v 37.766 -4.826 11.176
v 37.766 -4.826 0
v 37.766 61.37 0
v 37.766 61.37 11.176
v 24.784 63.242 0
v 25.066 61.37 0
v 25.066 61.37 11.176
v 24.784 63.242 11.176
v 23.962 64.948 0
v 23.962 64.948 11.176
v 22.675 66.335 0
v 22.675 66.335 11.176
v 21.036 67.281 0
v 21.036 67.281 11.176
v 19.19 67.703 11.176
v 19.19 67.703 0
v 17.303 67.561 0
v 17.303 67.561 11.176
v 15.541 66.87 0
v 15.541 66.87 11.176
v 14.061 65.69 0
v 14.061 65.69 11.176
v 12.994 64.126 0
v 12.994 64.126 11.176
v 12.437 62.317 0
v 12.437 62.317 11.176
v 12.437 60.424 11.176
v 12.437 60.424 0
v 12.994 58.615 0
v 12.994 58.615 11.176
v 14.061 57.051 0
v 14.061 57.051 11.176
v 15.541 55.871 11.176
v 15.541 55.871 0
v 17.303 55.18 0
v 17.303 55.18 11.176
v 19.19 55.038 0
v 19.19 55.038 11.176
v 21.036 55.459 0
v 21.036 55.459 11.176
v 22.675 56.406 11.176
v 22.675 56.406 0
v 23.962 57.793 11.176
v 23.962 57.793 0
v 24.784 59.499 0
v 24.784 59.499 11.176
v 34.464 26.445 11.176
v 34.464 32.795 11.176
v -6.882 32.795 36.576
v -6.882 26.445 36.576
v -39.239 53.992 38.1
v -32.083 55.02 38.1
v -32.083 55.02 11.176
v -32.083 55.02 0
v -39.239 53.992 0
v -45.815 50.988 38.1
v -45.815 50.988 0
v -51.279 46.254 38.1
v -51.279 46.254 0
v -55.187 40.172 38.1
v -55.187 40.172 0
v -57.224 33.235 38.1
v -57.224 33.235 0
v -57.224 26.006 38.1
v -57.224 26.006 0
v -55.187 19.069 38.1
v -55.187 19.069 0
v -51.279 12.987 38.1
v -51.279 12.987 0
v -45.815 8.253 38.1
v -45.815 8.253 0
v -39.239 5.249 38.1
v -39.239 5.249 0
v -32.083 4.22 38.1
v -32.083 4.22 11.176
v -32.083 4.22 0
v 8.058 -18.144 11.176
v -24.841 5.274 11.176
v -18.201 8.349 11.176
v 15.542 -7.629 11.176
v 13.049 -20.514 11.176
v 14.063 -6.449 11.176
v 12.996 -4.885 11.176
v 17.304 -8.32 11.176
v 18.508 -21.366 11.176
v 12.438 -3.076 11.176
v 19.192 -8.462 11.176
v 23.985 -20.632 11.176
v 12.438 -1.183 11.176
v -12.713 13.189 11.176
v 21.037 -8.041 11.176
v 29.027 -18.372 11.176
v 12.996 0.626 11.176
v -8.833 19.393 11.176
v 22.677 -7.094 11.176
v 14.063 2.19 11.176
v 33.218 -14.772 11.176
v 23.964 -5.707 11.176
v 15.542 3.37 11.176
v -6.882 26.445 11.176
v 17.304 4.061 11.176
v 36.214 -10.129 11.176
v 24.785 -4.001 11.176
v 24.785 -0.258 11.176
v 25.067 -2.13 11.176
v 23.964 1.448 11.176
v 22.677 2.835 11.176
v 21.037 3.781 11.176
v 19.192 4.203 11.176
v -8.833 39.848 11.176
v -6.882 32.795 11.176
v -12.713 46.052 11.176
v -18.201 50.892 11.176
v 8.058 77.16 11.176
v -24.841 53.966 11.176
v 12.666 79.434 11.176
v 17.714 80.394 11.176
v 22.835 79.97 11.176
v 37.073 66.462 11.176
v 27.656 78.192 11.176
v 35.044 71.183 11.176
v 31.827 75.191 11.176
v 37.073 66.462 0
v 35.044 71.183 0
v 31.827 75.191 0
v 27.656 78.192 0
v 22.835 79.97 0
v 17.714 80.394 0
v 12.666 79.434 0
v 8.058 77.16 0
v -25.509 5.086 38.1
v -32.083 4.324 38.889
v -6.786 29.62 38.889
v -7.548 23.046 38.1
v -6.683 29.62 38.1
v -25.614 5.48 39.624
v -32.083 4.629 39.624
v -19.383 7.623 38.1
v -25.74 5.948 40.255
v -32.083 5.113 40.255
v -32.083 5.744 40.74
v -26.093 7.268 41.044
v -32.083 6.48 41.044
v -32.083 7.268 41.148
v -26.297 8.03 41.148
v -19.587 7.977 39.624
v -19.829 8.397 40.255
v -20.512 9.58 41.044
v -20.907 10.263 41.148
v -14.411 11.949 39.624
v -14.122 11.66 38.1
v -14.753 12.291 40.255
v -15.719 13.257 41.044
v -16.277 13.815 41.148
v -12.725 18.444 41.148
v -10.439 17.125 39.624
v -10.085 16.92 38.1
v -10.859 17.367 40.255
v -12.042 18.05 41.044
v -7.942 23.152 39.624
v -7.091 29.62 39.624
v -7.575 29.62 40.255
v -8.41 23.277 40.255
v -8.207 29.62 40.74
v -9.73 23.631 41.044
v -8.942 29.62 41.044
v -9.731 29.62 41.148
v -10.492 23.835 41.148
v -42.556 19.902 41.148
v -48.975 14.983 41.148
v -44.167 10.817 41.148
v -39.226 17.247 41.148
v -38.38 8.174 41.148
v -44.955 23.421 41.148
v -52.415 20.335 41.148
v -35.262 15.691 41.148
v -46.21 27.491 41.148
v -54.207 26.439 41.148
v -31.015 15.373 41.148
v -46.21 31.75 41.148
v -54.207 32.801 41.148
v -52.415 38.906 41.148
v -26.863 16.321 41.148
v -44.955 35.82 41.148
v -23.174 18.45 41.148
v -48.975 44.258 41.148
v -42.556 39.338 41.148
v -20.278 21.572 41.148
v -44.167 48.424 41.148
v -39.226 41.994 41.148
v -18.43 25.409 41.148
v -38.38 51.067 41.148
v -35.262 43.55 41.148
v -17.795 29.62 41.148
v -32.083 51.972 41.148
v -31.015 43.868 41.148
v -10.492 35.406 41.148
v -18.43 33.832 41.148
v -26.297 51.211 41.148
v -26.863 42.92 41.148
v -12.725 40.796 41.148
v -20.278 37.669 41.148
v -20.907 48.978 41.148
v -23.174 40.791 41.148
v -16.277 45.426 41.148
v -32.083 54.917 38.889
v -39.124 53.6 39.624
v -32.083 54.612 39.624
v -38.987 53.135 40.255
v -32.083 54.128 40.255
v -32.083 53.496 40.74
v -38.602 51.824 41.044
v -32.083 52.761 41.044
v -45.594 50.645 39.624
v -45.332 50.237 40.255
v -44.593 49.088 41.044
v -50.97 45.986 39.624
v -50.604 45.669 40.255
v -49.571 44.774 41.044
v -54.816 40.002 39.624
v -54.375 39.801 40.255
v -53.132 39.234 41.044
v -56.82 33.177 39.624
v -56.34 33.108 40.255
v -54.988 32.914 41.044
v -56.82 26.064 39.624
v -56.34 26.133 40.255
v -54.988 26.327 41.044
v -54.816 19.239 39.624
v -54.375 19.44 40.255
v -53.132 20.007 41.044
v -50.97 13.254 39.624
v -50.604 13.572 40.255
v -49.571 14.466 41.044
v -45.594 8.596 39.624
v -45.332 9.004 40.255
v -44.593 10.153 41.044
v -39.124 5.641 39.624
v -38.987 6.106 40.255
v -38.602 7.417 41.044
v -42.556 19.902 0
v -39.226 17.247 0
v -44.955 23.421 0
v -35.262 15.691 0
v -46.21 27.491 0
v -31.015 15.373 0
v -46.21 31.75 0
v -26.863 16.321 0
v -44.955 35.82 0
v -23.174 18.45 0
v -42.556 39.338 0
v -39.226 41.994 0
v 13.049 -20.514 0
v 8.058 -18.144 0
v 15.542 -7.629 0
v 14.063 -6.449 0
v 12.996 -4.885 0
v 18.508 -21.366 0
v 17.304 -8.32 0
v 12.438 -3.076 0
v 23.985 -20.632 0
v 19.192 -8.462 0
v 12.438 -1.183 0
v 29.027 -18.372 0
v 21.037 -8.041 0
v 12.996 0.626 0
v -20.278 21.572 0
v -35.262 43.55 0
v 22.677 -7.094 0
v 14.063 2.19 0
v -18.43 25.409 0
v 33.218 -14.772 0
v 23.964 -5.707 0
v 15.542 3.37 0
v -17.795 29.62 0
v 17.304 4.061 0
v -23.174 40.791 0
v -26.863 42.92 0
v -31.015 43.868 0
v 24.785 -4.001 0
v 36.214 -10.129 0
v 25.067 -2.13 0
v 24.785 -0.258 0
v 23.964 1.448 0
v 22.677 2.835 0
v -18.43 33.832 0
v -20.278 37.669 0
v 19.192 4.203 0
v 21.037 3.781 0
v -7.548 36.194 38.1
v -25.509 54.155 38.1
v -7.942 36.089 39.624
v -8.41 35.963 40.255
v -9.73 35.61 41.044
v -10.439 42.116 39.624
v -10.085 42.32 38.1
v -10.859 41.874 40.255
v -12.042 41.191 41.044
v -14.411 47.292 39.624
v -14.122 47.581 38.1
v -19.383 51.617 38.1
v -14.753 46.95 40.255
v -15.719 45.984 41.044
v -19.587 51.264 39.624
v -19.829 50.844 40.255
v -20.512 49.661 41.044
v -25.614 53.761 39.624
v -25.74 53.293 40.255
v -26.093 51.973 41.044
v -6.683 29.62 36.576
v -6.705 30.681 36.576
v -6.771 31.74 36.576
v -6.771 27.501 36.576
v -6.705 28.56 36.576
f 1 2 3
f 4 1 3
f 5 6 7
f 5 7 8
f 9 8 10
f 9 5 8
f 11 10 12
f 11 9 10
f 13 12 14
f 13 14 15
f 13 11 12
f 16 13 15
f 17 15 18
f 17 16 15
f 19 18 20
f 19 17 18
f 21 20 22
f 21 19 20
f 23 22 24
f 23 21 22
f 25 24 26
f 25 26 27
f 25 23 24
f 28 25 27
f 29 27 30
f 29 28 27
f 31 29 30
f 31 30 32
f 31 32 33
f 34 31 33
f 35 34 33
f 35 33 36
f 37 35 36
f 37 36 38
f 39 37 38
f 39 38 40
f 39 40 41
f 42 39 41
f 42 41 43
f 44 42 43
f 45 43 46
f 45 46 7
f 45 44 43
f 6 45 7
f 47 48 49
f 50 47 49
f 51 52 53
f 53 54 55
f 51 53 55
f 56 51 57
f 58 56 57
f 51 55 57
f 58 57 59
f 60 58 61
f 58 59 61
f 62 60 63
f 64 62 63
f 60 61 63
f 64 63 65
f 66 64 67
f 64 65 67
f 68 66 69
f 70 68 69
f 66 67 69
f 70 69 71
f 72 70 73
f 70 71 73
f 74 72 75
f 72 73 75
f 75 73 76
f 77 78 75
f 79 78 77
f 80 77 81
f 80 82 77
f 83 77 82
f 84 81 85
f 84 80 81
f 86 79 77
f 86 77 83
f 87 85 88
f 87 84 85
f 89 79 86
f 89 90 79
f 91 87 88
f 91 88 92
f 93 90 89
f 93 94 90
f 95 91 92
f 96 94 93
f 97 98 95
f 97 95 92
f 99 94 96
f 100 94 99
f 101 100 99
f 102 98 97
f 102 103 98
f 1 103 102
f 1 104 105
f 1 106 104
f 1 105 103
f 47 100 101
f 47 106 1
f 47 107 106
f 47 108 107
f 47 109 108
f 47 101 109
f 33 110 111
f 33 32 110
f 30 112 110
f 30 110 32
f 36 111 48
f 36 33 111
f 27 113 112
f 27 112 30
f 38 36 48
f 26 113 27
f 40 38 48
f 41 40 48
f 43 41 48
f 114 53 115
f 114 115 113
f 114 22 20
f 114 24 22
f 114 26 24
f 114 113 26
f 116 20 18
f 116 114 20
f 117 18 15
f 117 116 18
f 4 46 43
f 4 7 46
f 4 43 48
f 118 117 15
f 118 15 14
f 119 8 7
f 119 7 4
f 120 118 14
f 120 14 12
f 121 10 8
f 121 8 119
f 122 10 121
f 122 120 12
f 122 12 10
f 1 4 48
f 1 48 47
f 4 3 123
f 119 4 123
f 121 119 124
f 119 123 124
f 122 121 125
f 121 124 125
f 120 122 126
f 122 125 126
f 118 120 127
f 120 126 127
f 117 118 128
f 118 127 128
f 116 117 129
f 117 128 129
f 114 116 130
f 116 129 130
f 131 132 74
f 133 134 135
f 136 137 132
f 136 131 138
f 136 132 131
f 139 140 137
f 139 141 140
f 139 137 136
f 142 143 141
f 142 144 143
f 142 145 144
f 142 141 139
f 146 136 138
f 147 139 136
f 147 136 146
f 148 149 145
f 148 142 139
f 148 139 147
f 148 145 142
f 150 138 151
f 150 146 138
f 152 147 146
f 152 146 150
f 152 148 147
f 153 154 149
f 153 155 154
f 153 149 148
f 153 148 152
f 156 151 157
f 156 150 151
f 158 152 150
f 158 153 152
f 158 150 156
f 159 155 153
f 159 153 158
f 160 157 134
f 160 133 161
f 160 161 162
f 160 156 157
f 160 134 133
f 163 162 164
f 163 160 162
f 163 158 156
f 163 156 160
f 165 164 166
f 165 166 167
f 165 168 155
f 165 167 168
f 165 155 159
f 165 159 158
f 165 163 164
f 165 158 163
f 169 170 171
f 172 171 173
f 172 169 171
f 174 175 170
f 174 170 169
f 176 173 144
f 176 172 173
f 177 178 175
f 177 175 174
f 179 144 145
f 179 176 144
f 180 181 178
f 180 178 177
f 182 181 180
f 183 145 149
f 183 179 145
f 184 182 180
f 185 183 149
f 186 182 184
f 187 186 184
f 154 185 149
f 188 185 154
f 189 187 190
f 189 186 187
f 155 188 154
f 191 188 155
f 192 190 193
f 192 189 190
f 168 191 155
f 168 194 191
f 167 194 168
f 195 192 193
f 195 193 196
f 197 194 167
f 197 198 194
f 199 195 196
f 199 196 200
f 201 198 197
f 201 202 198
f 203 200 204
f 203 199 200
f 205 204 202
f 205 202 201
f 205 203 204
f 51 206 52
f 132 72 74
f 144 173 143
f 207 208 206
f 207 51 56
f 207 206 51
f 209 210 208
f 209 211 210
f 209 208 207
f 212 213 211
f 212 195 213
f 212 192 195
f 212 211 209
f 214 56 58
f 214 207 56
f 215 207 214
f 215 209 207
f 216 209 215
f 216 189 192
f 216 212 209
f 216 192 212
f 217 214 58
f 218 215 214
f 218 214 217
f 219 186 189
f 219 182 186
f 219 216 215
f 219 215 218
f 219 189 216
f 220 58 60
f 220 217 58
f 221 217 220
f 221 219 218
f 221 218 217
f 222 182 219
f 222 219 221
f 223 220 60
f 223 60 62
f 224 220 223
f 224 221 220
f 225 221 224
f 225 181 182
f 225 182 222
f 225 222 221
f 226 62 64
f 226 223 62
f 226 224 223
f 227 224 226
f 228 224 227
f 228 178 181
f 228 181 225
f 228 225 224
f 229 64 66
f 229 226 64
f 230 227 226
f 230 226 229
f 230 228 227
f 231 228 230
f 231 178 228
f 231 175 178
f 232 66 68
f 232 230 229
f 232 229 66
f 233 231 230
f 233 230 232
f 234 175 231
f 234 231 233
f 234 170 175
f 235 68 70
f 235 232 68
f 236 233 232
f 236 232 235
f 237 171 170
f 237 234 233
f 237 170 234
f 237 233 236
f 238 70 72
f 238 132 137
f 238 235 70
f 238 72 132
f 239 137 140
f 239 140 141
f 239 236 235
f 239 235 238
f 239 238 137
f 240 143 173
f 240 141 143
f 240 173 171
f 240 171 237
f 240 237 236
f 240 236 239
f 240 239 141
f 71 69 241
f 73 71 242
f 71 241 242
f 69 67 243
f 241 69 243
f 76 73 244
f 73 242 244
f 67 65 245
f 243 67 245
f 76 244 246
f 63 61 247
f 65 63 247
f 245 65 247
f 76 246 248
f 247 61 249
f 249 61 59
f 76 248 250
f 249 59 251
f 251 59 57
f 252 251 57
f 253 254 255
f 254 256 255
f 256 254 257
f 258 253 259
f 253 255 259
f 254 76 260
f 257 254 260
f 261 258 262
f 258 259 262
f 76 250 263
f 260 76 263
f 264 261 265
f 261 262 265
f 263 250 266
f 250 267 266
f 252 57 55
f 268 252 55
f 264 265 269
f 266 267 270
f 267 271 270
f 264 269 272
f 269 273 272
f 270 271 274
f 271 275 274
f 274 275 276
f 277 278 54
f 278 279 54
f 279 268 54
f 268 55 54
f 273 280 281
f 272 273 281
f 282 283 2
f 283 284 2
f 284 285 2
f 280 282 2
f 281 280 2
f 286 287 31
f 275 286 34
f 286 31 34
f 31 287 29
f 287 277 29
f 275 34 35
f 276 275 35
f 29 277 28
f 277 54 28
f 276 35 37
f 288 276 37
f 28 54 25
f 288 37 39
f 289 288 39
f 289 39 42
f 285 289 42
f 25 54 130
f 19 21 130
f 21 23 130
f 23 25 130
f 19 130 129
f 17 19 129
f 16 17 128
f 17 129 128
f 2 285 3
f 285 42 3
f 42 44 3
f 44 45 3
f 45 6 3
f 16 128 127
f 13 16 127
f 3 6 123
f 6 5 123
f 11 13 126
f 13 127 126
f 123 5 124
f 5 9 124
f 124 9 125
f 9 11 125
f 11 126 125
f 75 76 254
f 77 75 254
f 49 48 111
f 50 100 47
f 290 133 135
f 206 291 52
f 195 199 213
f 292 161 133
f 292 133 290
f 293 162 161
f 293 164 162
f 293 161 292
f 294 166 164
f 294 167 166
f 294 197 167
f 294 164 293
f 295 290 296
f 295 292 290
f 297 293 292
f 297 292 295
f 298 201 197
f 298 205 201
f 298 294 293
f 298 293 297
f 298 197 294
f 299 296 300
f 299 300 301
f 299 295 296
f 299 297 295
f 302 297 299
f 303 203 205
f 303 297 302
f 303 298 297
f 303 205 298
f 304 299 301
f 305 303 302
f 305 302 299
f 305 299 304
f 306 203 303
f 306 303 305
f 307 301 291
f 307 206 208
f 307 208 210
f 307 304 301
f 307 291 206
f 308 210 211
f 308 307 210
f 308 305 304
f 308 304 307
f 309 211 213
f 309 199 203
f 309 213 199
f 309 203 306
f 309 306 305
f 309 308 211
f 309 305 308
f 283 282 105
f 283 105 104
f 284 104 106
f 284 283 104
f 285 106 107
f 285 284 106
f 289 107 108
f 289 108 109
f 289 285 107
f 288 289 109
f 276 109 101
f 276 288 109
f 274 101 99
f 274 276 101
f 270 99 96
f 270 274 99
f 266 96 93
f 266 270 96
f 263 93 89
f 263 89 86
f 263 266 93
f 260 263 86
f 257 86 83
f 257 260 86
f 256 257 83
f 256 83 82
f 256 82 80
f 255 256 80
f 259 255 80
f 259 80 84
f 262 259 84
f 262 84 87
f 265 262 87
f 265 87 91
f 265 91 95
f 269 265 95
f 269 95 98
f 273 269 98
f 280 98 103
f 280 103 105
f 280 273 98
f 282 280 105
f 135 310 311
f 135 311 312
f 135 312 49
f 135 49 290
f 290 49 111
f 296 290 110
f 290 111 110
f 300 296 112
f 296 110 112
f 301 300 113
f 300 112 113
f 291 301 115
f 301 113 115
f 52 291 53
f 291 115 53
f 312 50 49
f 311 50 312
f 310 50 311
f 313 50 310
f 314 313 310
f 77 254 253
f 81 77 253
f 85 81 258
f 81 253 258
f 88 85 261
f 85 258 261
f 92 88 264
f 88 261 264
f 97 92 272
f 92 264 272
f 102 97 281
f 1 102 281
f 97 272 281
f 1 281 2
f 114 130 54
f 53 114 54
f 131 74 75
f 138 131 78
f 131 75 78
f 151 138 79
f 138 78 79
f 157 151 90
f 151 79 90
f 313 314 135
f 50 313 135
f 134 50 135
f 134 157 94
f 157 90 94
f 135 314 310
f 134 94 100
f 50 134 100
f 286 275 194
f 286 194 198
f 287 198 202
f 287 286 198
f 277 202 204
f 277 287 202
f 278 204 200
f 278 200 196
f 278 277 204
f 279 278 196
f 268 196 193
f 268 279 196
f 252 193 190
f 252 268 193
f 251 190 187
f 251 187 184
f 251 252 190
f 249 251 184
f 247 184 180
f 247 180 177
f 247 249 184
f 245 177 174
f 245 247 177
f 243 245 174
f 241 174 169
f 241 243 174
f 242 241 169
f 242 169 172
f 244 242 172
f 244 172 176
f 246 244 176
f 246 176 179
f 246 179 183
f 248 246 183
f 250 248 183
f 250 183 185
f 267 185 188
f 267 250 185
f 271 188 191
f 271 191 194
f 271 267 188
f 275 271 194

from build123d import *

# Parameters (mm, degrees)
F0_R     = 14.2875
F1_DEPTH = 41.148
F0_R_2   = 6.35
F2_DEPTH = 11.176
F3_R     = 3.048
F5_DEPTH = 25.4
F7_DEPTH = 54.1640026378


with BuildPart() as f1:
    # F0 (on Top) → F1 (new body)
    with BuildSketch(Plane.XY):
        with BuildLine():
            ThreePointArc((-32.0825431228, 4.2204351945), (-14.1220308807, 11.6599229523), (-6.6825431228, 29.6204351945))
            ThreePointArc((-6.6825431228, 29.6204351945), (-14.1220308807, 47.5809474366), (-32.0825431228, 55.0204351945))
            ThreePointArc((-32.0825431228, 55.0204351945), (-57.4825431228, 29.6204351945), (-32.0825431228, 4.2204351945))
        make_face()
        with Locations((-32.0825431228, 29.6204351945)):
            Circle(F0_R, mode=Mode.SUBTRACT)
    extrude(amount=F1_DEPTH)

    # F0 (on Top) → F2 (join)
    with BuildSketch(Plane.XY):
        with BuildLine():
            ThreePointArc((-32.0825431228, 55.0204351945), (-14.1220308807, 47.5809474366), (-6.6825431228, 29.6204351945))
            ThreePointArc((-6.6825431228, 29.6204351945), (-14.1220308807, 11.6599229523), (-32.0825431228, 4.2204351945))
            Line((-32.0825431228, 4.2204351945), (8.057578387, -18.1441748871))
            ThreePointArc((8.057578387, -18.1441748871), (26.5875021064, -19.6841406643), (37.7656240054, -4.8255014786))
            Line((37.7656240054, -4.8255014786), (37.7656240054, 61.3704351945))
            ThreePointArc((37.7656240054, 61.3704351945), (27.6561701568, 78.1921216294), (8.057578387, 77.159943217))
            Line((8.057578387, 77.159943217), (-32.0825431228, 55.0204351945))
        make_face()
        with Locations((18.7174568772, -2.1295648055)):
            Circle(F0_R_2, mode=Mode.SUBTRACT)
        with Locations((18.7156240054, 61.3704351945)):
            Circle(F0_R_2, mode=Mode.SUBTRACT)
    extrude(amount=F2_DEPTH)

    # F3
    f3_edges = [f1.edges().sort_by_distance(p)[0] for p in [
        (-32.082543, 4.220435, 41.148),
    ]]
    fillet(f3_edges, radius=F3_R)

    # F4 (on face) → F5 (join)
    with BuildSketch(Plane.XY.offset(11.176)):
        with BuildLine():
            Line((34.4636240054, 26.4454351945), (34.4636240054, 32.7954351945))
            Line((34.4636240054, 32.7954351945), (-6.8817618849, 32.7954351945))
            ThreePointArc((-6.8817618849, 32.7954351945), (-6.6825431228, 29.6204351945), (-6.8817618849, 26.4454351945))
            Line((-6.8817618849, 26.4454351945), (34.4636240054, 26.4454351945))
        make_face()
    extrude(amount=F5_DEPTH)

    # F6 (on face) → F7 (cut, through all)
    with BuildSketch(Plane(origin=(0, 32.7954351945, 0), x_dir=(-1, 0, 0), z_dir=(0, 1, 0))):
        Polygon((-34.4636240054, 11.176), (6.8817618849, 36.576), (-34.4636240054, 36.576), align=None)
    extrude(amount=-F7_DEPTH, mode=Mode.SUBTRACT)


solid = f1.part
